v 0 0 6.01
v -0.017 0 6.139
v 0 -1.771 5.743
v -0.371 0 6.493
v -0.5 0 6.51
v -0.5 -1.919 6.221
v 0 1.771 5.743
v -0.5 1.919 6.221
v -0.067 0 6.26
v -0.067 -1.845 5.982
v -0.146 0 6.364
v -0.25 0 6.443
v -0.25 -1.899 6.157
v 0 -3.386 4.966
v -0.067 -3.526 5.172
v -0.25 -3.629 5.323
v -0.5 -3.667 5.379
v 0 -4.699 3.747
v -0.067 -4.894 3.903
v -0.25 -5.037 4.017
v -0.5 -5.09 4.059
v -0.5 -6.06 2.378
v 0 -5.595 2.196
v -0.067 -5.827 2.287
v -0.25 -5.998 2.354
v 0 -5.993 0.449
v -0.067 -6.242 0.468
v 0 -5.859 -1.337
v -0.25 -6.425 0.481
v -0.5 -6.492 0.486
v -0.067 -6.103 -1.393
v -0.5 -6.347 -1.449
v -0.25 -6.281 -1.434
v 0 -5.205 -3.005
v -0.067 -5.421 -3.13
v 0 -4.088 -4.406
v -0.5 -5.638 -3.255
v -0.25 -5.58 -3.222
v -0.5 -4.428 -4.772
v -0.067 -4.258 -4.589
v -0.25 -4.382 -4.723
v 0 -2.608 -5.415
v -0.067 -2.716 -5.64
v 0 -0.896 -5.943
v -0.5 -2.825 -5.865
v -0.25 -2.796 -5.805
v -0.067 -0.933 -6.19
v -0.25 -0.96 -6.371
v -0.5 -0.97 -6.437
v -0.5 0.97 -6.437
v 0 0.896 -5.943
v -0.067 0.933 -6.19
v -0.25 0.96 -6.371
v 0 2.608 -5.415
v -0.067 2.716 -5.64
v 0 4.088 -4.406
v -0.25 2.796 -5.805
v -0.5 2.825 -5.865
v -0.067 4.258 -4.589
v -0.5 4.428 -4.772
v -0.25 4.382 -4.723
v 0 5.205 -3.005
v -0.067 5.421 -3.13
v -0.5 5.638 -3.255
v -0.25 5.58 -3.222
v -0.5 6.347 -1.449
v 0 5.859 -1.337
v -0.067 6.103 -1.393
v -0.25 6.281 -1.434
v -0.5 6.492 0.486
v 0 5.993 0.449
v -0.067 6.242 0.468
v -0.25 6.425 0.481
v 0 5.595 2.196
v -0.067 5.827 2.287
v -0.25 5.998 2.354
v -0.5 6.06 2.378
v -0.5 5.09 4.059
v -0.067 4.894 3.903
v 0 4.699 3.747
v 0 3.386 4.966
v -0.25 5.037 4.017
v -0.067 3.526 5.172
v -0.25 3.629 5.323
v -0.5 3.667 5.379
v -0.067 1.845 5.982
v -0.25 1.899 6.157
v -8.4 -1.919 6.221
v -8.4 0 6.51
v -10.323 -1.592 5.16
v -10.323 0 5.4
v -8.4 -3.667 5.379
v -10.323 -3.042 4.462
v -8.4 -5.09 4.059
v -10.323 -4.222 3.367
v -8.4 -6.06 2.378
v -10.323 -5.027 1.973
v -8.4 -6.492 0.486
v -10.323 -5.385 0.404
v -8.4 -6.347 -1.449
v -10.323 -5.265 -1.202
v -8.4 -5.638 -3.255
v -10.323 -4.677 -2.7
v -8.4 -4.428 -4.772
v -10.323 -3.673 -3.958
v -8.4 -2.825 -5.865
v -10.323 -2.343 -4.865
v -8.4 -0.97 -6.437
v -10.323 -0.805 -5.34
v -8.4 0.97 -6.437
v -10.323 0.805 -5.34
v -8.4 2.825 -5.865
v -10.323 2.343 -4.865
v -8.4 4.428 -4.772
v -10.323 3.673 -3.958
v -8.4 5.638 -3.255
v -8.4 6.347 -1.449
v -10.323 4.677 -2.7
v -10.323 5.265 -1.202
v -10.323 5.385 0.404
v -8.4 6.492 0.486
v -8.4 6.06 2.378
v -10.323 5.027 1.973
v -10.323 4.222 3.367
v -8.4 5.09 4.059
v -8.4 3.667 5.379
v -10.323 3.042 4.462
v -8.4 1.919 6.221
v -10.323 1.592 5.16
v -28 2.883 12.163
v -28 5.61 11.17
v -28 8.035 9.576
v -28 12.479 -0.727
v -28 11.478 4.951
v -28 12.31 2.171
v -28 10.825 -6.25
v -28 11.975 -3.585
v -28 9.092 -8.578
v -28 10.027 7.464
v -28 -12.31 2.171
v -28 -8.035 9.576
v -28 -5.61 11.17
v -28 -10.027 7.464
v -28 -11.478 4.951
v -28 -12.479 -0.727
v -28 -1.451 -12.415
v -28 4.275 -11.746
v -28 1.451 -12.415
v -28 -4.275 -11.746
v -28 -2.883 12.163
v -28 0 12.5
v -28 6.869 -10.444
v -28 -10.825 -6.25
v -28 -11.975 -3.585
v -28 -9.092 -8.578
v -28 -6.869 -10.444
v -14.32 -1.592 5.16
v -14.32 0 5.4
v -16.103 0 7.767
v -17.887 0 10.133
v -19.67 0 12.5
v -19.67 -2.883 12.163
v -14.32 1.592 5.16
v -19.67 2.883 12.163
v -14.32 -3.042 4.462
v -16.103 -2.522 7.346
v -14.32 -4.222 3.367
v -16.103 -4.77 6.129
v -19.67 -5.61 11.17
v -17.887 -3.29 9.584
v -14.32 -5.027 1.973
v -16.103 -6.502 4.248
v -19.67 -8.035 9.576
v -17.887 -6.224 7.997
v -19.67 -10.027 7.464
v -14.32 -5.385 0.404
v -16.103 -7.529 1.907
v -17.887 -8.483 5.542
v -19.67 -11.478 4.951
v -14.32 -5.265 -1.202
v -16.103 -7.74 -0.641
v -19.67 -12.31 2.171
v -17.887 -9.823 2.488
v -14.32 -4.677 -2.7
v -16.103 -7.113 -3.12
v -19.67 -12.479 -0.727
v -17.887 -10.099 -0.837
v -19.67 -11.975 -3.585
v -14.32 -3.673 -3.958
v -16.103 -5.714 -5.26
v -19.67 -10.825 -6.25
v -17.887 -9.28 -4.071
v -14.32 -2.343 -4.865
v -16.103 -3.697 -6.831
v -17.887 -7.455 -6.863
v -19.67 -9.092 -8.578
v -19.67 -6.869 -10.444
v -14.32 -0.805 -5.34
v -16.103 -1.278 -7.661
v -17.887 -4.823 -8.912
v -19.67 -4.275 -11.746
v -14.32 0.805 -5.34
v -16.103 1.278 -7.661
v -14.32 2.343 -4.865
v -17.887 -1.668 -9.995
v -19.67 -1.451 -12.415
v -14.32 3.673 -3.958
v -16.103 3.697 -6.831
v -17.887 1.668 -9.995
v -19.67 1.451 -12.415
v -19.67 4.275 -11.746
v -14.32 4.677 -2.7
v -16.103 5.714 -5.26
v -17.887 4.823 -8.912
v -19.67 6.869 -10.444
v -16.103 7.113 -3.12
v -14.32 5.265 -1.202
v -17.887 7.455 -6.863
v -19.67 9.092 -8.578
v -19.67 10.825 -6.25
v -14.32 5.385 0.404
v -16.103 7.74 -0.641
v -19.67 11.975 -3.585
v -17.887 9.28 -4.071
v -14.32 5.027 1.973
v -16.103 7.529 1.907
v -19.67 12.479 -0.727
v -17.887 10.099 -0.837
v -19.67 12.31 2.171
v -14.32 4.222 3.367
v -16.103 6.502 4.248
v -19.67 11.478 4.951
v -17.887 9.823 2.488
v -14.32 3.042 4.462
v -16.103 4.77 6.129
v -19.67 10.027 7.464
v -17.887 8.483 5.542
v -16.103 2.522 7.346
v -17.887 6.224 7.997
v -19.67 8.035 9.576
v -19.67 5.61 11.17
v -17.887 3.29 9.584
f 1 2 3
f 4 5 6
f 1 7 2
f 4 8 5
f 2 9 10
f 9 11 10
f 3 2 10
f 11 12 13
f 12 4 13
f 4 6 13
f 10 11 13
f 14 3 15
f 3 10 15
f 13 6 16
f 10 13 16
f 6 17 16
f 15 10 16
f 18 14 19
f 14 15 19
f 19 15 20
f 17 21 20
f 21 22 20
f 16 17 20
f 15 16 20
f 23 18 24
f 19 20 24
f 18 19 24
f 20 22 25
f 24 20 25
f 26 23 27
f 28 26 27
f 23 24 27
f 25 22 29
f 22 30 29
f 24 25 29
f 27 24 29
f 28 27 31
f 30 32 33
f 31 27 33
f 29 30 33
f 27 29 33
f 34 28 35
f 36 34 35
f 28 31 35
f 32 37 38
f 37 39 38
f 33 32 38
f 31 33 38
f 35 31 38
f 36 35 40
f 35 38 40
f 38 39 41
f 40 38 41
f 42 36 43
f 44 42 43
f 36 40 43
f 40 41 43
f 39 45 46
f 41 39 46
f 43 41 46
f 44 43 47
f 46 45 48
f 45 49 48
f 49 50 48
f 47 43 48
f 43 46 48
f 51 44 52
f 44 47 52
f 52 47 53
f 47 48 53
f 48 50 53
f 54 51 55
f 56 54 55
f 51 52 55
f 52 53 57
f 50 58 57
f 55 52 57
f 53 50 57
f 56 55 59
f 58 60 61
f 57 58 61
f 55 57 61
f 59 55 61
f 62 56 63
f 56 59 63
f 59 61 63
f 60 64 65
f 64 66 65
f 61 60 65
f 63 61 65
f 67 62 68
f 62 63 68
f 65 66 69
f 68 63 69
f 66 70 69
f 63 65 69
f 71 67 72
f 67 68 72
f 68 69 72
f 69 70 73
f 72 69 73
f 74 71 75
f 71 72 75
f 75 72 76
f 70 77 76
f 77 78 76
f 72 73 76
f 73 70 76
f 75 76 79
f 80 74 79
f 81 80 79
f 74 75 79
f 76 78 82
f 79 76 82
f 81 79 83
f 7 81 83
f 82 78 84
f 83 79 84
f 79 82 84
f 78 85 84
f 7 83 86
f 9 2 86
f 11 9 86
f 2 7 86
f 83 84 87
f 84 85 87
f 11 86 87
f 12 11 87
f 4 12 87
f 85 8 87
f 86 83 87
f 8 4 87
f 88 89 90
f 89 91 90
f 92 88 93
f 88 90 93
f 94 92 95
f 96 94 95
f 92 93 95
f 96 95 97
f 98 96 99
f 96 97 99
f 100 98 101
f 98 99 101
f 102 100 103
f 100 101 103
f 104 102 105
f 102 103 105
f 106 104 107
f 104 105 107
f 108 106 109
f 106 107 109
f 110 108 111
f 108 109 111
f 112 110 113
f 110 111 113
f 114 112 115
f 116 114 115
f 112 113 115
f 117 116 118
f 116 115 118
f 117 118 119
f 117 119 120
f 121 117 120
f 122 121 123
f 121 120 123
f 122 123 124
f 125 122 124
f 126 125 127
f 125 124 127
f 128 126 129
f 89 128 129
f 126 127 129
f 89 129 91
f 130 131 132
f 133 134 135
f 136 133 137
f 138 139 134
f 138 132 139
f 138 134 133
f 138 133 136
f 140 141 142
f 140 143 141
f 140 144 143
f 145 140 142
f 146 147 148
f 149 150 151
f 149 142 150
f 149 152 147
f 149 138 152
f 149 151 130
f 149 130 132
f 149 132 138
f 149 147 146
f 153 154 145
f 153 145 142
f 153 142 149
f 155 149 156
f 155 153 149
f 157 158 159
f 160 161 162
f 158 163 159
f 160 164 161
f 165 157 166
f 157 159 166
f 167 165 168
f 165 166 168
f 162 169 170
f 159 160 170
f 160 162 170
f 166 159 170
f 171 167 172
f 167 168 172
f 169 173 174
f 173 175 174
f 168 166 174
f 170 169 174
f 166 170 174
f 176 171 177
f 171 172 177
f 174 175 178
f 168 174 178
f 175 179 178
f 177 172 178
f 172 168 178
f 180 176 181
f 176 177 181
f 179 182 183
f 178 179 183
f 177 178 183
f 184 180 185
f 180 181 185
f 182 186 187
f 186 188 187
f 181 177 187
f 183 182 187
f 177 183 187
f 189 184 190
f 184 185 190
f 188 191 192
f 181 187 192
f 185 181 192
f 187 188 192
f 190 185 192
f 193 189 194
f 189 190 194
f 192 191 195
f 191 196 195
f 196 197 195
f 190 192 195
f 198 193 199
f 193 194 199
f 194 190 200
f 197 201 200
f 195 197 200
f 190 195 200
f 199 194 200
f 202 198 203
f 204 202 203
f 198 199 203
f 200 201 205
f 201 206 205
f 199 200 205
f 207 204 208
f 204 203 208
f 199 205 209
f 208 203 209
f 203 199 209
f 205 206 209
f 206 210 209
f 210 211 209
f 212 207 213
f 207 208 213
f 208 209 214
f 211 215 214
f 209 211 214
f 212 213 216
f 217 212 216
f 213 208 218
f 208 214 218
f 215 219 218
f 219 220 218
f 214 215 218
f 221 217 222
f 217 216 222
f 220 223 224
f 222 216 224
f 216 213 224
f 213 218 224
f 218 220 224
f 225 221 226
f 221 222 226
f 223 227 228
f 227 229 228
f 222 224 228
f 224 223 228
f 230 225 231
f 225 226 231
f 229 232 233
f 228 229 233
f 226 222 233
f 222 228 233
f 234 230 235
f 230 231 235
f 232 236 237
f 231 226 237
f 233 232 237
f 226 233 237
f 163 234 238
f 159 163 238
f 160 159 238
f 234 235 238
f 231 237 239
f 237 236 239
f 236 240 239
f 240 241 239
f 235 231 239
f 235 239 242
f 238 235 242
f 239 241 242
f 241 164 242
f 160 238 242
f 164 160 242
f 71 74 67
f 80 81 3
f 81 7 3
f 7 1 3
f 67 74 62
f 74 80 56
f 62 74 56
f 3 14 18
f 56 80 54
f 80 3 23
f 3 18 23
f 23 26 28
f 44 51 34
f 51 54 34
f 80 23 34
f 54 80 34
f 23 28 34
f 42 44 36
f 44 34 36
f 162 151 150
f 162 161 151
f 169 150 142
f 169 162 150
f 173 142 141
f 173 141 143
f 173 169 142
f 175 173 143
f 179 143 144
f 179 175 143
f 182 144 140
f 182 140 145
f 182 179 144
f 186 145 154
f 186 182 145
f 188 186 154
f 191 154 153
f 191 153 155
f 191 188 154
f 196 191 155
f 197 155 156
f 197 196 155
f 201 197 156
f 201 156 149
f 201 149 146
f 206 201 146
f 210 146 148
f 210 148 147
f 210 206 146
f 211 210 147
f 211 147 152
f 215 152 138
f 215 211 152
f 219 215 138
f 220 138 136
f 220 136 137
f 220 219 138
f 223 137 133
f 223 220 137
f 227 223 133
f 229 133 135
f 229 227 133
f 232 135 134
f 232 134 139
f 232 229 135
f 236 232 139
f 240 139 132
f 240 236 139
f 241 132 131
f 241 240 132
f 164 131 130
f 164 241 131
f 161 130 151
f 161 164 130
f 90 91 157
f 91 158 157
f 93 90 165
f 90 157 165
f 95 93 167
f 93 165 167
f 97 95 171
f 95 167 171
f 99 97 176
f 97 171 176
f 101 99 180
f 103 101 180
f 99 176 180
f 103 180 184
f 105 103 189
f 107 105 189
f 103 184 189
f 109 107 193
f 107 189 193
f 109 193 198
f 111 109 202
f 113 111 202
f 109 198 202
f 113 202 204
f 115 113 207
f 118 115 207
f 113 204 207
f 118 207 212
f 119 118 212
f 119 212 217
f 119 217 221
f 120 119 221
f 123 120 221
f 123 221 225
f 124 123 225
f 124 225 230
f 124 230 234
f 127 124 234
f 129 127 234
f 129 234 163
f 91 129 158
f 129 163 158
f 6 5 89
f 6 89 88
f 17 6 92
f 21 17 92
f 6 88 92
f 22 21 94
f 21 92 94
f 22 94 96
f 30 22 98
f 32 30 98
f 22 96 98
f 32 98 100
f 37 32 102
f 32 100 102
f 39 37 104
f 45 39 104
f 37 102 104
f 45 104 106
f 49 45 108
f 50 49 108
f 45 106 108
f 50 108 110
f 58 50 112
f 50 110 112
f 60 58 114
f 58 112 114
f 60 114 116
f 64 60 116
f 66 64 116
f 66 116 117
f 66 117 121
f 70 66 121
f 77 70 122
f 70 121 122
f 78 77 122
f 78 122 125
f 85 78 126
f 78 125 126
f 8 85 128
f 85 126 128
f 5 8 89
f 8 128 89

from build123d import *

# Parameters (mm, degrees)
F0_W = 8.33
F0_H = 12.5


with BuildPart() as f1:
    # F0 (on Front) → F1 (revolve)
    with BuildSketch(Plane.XZ):
        with BuildLine():
            Line((-8.4, 0), (0, 0))
            Line((0, 0), (0, 6.01))
            ThreePointArc((0, 6.01), (-0.146447, 6.363553), (-0.5, 6.51))
            Line((-0.5, 6.51), (-8.4, 6.51))
            Line((-8.4, 6.51), (-8.4, 0))
        make_face()
        Polygon((-10.322576, 0), (-8.4, 0), (-8.4, 6.51), (-10.322576, 5.4), align=None)
        Polygon((-19.67, 0), (-10.322576, 0), (-10.322576, 5.4), (-14.319766, 5.4), (-19.67, 12.5), align=None)
        with Locations((-23.835, 6.25)):
            Rectangle(F0_W, F0_H)
    revolve(axis=Axis((-14, 0, 0), (1, 0, 0)))


solid = f1.part
